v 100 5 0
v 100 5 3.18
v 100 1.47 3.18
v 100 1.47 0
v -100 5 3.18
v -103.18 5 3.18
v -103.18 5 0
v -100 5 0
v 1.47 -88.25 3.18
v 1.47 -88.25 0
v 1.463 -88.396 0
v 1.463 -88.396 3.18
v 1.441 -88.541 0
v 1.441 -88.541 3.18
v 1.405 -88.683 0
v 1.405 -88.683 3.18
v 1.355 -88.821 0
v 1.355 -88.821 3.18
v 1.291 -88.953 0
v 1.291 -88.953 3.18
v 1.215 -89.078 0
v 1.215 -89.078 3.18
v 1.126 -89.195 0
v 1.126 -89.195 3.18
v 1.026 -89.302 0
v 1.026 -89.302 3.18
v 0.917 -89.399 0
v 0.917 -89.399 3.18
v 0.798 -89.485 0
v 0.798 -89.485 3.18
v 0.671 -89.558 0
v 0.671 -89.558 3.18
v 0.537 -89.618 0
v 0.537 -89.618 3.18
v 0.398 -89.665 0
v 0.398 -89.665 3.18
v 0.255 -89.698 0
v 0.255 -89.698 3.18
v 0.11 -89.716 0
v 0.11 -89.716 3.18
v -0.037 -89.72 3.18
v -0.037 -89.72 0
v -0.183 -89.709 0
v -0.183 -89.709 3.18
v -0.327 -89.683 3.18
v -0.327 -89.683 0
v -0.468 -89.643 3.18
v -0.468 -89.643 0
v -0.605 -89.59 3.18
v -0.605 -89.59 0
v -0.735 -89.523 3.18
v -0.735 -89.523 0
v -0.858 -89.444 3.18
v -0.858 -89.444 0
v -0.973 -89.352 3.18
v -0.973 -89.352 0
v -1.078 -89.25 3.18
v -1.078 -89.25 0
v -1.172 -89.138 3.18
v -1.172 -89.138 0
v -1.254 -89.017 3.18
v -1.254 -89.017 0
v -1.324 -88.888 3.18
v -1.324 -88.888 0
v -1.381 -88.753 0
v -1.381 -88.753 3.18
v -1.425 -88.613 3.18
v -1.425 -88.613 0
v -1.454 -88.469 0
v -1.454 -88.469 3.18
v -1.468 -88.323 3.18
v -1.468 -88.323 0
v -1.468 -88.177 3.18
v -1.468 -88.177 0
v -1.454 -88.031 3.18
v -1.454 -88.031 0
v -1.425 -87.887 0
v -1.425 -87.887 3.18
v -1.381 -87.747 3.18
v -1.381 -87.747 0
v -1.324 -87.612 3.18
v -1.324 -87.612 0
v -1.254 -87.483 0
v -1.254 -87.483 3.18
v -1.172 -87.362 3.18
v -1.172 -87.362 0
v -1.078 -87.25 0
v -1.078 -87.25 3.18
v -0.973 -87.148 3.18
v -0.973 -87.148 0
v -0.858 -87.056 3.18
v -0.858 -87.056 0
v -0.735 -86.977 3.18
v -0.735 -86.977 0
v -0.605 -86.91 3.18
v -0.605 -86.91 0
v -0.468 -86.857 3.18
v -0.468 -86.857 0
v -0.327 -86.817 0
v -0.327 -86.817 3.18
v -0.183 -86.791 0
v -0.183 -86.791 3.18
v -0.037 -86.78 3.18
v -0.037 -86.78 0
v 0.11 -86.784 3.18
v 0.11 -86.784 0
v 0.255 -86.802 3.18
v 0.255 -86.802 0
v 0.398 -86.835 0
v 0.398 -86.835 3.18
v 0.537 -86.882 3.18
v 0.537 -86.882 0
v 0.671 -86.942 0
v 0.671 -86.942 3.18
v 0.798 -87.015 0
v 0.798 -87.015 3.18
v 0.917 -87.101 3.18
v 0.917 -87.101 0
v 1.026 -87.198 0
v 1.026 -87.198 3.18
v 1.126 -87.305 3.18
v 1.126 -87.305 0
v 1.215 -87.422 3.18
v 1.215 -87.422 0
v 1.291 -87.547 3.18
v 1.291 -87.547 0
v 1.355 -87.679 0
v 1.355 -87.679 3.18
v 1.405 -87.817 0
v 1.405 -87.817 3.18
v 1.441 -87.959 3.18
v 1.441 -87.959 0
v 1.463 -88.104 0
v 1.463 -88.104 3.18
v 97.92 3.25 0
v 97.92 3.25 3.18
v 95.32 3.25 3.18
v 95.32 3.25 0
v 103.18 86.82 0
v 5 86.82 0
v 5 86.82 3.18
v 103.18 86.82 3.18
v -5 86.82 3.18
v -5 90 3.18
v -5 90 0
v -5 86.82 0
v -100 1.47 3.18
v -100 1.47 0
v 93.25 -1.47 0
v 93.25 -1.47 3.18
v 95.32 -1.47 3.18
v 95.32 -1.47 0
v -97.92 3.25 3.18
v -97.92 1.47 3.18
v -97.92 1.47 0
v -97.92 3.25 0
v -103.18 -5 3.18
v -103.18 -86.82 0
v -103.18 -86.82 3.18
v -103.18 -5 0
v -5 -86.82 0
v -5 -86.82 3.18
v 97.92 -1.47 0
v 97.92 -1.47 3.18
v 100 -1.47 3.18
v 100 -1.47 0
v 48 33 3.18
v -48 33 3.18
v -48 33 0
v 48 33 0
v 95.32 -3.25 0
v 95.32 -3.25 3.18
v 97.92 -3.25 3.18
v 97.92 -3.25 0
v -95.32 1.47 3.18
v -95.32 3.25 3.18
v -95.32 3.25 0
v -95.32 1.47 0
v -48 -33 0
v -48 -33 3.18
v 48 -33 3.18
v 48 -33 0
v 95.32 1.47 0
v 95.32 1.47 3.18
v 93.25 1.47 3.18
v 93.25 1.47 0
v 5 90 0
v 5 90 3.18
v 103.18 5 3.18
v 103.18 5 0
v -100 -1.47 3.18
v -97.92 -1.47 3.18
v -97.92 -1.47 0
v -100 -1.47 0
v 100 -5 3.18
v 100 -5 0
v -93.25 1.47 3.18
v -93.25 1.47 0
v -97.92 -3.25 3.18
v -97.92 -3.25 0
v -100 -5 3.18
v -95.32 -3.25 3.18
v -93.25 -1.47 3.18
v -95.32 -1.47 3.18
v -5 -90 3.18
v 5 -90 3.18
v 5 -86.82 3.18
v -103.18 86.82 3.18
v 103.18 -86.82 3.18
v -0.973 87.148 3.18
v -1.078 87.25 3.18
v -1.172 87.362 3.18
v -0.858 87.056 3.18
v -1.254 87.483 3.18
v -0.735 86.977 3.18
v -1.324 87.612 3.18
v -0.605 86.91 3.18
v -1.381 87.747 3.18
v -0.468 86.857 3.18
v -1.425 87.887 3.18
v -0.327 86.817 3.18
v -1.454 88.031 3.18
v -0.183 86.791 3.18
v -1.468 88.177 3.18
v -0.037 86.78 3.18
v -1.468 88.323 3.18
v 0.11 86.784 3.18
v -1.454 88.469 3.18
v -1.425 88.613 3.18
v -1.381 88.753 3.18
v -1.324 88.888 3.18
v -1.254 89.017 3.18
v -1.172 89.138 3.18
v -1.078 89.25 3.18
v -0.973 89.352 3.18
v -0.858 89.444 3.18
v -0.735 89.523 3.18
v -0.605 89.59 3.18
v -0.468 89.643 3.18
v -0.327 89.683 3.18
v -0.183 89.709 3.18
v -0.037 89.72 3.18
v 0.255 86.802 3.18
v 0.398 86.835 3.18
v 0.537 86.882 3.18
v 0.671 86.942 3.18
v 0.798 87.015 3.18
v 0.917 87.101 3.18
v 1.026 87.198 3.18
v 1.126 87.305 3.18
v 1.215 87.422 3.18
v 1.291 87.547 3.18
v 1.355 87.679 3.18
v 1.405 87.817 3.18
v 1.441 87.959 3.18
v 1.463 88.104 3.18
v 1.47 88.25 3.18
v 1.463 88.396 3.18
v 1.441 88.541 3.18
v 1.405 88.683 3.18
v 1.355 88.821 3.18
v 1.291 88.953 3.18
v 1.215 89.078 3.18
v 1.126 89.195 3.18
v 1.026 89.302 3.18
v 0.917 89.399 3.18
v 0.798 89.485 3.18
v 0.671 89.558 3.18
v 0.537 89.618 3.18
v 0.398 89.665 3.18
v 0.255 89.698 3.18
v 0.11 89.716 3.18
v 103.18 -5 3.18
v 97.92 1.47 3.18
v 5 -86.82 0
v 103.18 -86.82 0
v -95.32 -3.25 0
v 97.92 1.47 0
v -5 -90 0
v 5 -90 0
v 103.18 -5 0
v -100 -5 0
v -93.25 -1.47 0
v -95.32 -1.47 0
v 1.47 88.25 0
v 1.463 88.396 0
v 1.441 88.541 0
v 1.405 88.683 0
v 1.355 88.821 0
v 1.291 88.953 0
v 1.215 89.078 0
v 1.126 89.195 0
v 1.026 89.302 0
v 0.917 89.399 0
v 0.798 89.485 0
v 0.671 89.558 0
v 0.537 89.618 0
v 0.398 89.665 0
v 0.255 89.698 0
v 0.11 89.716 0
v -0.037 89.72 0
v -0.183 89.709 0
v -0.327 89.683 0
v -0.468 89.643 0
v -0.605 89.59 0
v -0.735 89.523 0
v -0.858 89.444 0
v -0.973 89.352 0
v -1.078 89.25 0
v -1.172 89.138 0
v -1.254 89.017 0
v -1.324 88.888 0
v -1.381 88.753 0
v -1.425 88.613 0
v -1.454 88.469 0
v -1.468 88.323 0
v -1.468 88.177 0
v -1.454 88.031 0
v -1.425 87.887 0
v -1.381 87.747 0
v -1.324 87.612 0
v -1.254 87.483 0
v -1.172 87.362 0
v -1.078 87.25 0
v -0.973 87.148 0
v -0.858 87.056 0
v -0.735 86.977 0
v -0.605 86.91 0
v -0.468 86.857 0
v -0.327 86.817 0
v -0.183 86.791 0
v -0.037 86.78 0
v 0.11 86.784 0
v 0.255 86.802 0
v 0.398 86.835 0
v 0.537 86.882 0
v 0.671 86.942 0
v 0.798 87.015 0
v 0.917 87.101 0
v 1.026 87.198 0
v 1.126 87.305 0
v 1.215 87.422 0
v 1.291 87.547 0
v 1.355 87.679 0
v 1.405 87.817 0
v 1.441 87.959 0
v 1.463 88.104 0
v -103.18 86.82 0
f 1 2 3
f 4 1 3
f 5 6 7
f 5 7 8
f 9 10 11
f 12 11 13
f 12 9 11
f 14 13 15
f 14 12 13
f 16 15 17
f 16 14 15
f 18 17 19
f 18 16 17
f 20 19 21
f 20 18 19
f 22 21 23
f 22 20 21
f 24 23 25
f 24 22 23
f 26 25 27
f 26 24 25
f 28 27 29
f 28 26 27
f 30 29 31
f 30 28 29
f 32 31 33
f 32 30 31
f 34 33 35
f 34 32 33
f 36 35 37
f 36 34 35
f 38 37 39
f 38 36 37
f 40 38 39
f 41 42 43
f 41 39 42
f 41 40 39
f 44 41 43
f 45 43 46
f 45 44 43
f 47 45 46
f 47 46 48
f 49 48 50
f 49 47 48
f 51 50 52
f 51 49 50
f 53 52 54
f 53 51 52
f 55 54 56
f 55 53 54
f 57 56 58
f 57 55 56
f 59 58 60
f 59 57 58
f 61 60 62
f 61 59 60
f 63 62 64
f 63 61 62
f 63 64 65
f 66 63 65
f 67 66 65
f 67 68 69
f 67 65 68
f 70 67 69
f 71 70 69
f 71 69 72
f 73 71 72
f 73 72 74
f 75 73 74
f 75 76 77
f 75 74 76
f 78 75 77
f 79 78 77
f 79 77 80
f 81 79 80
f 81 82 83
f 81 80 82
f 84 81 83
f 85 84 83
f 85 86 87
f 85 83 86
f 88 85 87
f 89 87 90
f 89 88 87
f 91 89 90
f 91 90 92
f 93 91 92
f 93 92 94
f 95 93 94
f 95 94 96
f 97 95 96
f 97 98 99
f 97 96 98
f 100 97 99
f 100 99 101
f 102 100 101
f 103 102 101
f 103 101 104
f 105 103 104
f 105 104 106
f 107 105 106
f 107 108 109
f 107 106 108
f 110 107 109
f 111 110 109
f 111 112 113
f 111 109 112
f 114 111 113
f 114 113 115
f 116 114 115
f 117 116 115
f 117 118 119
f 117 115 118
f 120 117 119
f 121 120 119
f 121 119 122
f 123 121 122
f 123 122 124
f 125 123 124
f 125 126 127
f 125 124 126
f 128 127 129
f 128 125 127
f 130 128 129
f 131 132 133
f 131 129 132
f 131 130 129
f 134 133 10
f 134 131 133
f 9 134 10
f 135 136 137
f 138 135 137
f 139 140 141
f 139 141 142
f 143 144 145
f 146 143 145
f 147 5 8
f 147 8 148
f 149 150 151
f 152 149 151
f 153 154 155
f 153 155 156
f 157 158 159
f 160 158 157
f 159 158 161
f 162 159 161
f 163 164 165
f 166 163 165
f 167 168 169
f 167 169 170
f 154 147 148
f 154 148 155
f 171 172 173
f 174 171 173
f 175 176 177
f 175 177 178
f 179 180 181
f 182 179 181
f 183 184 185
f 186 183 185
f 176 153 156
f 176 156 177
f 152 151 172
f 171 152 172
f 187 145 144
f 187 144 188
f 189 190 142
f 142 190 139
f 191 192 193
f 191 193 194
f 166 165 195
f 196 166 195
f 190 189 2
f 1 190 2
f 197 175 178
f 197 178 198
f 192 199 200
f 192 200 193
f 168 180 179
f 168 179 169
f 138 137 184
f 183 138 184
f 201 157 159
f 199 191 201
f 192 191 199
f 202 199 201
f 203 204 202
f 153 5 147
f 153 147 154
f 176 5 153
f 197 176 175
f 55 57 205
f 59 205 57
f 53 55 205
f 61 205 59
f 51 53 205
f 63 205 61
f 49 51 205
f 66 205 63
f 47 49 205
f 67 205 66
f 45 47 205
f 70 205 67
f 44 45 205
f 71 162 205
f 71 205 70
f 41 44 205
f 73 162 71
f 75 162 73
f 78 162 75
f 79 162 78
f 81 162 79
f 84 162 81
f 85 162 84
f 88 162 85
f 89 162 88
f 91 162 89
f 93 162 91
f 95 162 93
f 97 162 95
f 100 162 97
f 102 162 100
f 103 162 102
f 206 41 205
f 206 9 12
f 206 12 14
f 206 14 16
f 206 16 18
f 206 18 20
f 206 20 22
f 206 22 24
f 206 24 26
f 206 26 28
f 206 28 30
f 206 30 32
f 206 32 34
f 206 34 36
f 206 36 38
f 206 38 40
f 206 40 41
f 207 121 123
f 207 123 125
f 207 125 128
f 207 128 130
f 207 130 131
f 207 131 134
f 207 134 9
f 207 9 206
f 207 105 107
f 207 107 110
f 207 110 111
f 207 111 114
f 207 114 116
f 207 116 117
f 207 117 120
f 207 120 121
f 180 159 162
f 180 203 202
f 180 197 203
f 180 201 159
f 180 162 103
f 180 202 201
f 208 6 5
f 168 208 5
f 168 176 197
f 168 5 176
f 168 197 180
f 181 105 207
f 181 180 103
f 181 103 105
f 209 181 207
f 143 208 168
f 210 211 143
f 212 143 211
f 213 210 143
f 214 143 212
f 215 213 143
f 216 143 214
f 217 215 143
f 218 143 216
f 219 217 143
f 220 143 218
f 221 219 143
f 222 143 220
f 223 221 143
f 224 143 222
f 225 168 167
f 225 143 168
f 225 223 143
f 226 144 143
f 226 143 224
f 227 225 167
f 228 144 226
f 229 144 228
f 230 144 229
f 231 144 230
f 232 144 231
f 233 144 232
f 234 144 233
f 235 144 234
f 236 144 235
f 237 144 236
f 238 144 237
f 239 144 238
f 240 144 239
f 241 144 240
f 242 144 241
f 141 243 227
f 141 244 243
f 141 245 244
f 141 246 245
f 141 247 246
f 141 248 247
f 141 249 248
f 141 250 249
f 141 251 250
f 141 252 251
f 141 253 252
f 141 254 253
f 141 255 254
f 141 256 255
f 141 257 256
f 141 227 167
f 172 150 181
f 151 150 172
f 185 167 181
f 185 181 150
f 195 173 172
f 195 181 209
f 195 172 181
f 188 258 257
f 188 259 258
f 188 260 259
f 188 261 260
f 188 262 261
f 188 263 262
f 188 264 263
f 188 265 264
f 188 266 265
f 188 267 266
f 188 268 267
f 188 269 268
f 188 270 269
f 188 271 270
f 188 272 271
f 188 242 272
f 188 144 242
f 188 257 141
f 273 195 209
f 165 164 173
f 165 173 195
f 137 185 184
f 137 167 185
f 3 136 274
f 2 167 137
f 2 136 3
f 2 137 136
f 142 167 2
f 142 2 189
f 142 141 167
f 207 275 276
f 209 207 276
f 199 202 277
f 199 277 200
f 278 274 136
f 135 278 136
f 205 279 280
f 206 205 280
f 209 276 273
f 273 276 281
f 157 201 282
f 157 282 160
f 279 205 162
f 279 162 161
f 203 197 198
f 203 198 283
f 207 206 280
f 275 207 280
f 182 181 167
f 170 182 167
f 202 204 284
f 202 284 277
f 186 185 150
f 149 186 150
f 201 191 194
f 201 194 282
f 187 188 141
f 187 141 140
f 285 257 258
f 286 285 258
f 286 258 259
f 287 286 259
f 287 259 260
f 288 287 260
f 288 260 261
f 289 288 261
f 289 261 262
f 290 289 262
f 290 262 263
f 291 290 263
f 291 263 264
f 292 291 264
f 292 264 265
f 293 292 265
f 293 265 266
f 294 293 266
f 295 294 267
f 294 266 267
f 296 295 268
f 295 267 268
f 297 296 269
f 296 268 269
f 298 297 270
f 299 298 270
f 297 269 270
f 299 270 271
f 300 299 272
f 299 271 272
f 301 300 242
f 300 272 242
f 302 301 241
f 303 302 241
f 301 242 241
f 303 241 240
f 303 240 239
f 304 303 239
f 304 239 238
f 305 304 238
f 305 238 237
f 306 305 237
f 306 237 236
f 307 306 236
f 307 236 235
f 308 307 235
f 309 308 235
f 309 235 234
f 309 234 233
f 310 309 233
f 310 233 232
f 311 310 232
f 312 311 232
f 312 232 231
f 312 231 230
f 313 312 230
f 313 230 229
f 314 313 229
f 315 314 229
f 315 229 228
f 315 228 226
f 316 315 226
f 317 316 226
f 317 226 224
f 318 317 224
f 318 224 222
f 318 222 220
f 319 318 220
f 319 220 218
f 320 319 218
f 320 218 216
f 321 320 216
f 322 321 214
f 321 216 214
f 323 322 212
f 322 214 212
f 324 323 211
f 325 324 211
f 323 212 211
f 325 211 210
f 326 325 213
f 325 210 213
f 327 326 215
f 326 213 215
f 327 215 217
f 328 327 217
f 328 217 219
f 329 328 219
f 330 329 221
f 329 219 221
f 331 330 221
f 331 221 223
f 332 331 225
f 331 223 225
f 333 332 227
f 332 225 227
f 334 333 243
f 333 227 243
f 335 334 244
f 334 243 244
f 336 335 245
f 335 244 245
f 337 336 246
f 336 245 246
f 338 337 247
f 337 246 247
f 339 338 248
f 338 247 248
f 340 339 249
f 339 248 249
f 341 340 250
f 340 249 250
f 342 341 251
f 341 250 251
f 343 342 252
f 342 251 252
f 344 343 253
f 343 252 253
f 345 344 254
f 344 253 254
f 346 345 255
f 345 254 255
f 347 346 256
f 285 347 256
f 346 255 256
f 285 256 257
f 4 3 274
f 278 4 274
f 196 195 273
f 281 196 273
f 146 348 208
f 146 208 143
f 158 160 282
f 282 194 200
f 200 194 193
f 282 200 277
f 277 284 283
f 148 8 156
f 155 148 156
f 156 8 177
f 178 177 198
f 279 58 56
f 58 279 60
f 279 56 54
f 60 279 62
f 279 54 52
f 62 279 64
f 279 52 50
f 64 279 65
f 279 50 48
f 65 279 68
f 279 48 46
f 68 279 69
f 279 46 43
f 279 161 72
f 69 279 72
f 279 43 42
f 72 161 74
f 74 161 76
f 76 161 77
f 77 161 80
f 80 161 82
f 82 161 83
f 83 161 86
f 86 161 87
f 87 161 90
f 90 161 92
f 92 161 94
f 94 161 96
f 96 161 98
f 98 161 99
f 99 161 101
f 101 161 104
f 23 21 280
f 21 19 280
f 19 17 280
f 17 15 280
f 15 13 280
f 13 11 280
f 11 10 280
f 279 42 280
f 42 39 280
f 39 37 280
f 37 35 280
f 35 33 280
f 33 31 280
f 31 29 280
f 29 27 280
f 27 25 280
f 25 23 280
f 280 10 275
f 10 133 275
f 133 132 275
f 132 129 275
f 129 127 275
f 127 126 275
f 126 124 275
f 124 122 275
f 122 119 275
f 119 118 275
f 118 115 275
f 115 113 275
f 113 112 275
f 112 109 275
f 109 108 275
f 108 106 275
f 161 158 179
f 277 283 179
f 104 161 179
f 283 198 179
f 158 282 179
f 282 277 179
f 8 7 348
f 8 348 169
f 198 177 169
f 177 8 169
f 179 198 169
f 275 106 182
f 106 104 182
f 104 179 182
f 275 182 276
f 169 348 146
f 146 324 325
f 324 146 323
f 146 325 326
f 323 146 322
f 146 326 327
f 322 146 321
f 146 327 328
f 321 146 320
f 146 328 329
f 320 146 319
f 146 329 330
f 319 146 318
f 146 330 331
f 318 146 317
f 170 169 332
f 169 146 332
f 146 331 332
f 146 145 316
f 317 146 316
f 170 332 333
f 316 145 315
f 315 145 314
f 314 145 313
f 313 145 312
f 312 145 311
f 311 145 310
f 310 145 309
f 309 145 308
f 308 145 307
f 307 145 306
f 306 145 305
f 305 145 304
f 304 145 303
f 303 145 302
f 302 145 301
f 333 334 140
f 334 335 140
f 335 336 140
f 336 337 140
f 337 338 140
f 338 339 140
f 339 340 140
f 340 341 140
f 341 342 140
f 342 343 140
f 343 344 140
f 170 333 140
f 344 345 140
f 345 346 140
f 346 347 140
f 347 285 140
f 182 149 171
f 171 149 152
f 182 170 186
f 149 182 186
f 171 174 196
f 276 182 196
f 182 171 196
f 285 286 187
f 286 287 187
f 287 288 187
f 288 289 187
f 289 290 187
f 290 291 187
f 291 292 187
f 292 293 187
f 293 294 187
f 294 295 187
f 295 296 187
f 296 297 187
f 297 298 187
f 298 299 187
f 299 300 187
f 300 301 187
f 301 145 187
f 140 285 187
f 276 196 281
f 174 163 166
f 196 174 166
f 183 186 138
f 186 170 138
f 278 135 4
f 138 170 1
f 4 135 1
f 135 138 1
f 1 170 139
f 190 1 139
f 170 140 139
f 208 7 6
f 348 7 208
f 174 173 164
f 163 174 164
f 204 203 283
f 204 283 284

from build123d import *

# Parameters (mm, degrees)
SKETCH2_W           = 206.36
SKETCH2_H           = 173.64
BOSS_EXTRUDE1_DEPTH = 3.18
CUT_EXTRUDE1_DEPTH  = 135.884903529
SKETCH9_W           = 10
SKETCH9_H           = 3.18
BOSS_EXTRUDE4_DEPTH = 3.18
SKETCH11_R          = 1.47
CUT_EXTRUDE3_DEPTH  = 137.953367246
SKETCH12_W          = 96
SKETCH12_H          = 66
CUT_EXTRUDE4_DEPTH  = 137.953367246


with BuildPart() as part:
    # Sketch2 → Boss-Extrude1 (new body)
    with BuildSketch(Plane.XY):
        Rectangle(SKETCH2_W, SKETCH2_H)
    extrude(amount=BOSS_EXTRUDE1_DEPTH)

    # Sketch3 → Cut-Extrude1 (cut, through all)
    with BuildSketch(Plane.XY.offset(3.18)):
        Polygon((-95.32, -1.47), (-95.32, -3.25), (-97.92, -3.25), (-97.92, -1.47), (-100, -1.47), (-100, -5), (-103.18, -5), (-103.18, 5), (-100, 5), (-100, 1.47), (-97.92, 1.47), (-97.92, 3.25), (-95.32, 3.25), (-95.32, 1.47), (-93.25, 1.47), (-93.25, -1.47), align=None)
    cut_extrude1 = extrude(amount=-CUT_EXTRUDE1_DEPTH, mode=Mode.SUBTRACT)

    # Sketch9 → Boss-Extrude4 (add)
    with BuildSketch(Plane(origin=(0, 86.82, 0), x_dir=(1, 0, 0), z_dir=(0, 1, 0))):
        with Locations((0, -1.59)):
            Rectangle(SKETCH9_W, SKETCH9_H)
    boss_extrude4 = extrude(amount=BOSS_EXTRUDE4_DEPTH)

    # Sketch11 → Cut-Extrude3 (cut, through all)
    with BuildSketch(Plane.XY.offset(3.18)):
        with Locations((0, 88.25)):
            Circle(SKETCH11_R)
    cut_extrude3 = extrude(amount=-CUT_EXTRUDE3_DEPTH, mode=Mode.SUBTRACT)

    # Mirror1: Cut-Extrude1 across plane
    add(cut_extrude1.mirror(Plane(origin=(0, 0, 0), x_dir=(0, 0, 1), z_dir=(1, 0, 0))), mode=Mode.SUBTRACT)

    # Mirror2: Boss-Extrude4, Cut-Extrude3 across plane
    add(boss_extrude4.mirror(Plane.ZX))
    add(cut_extrude3.mirror(Plane.ZX), mode=Mode.SUBTRACT)

    # Sketch12 → Cut-Extrude4 (cut, through all)
    with BuildSketch(Plane.XY.offset(3.18)):
        Rectangle(SKETCH12_W, SKETCH12_H)
    extrude(amount=-CUT_EXTRUDE4_DEPTH, mode=Mode.SUBTRACT)


solid = part.part
